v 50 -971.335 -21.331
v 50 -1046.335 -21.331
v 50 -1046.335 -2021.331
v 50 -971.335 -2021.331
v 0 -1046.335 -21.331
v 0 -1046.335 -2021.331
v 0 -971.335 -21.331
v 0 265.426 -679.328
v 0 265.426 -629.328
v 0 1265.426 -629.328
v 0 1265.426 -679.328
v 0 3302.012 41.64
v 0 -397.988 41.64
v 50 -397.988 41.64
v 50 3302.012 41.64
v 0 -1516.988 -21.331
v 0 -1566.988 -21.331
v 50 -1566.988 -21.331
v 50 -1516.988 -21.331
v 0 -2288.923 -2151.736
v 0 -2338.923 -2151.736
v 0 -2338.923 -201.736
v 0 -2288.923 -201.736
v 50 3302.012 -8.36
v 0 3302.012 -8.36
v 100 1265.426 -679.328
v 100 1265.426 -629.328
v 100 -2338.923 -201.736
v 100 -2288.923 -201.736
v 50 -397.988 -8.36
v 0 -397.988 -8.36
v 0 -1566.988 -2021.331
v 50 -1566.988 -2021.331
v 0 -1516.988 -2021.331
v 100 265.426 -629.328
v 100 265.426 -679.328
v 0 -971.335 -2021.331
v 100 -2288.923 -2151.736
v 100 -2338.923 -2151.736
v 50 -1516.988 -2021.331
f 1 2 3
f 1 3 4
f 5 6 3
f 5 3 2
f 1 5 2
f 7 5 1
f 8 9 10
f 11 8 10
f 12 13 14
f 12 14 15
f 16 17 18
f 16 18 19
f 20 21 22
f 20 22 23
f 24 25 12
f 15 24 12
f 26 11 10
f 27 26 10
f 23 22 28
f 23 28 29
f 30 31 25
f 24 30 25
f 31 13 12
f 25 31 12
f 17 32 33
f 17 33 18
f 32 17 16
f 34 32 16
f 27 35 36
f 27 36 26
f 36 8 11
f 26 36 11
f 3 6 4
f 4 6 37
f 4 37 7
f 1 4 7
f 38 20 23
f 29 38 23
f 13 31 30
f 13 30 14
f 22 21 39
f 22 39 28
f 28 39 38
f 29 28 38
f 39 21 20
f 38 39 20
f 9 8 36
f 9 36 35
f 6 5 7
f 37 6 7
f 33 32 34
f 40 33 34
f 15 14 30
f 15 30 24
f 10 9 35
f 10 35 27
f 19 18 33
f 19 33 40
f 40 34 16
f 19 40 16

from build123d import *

# Parameters (mm, degrees)
F0_W     = 3700
F0_H     = 50
F0_W_2   = 75
F0_H_2   = 2000
F0_W_3   = 50
F1_DEPTH = 50
F0_W_4   = 1000
F0_H_3   = 1950
F2_DEPTH = 100


with BuildPart() as f1:
    # F0 (on Right) → F1 (new body)
    with BuildSketch(Plane.YZ):
        with Locations((1452.012424, 16.64005)):
            Rectangle(F0_W, F0_H)
        with Locations((-1008.83522, -1021.33131)):
            Rectangle(F0_W_2, F0_H_2)
        with Locations((-1541.988468, -1021.33131)):
            Rectangle(F0_W_3, F0_H_2)
    extrude(amount=F1_DEPTH)


with BuildPart() as f2:
    # F0 (on Right) → F2 (new body)
    with BuildSketch(Plane.YZ):
        with Locations((765.426189, -654.328084)):
            Rectangle(F0_W_4, F0_H)
        with Locations((-2313.923216, -1176.736259)):
            Rectangle(F0_W_3, F0_H_3)
    extrude(amount=F2_DEPTH)


solid = Compound([f1.part, f2.part])
